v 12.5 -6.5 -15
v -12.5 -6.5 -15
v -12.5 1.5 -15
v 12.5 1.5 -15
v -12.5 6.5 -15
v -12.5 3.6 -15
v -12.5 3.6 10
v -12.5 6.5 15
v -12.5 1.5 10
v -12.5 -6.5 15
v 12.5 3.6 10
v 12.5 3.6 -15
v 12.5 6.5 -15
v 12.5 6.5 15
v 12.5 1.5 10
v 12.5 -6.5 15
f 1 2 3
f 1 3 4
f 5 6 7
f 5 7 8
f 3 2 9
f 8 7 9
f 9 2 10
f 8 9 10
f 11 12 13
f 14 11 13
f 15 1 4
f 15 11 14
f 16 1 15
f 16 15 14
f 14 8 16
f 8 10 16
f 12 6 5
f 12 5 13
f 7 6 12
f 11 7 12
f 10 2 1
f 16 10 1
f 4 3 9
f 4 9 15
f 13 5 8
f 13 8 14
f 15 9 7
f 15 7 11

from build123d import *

# Parameters (mm, degrees)
F0_W     = 25
F0_H     = 30
F1_DEPTH = 6.5
F2_W     = 25
F2_H     = 2.1
F3_DEPTH = 25


with BuildPart() as f1:
    # F0 (on Front) → F1 (new body, symmetric)
    with BuildSketch(Plane.XZ):
        Rectangle(F0_W, F0_H)
    extrude(amount=F1_DEPTH, both=True)

    # F2 (on face) → F3 (cut)
    with BuildSketch(Plane(origin=(0, 0, -15), x_dir=(1, 0, 0), z_dir=(0, 0, -1))):
        with Locations((0, -2.55)):
            Rectangle(F2_W, F2_H)
    extrude(amount=-F3_DEPTH, mode=Mode.SUBTRACT)


solid = f1.part
